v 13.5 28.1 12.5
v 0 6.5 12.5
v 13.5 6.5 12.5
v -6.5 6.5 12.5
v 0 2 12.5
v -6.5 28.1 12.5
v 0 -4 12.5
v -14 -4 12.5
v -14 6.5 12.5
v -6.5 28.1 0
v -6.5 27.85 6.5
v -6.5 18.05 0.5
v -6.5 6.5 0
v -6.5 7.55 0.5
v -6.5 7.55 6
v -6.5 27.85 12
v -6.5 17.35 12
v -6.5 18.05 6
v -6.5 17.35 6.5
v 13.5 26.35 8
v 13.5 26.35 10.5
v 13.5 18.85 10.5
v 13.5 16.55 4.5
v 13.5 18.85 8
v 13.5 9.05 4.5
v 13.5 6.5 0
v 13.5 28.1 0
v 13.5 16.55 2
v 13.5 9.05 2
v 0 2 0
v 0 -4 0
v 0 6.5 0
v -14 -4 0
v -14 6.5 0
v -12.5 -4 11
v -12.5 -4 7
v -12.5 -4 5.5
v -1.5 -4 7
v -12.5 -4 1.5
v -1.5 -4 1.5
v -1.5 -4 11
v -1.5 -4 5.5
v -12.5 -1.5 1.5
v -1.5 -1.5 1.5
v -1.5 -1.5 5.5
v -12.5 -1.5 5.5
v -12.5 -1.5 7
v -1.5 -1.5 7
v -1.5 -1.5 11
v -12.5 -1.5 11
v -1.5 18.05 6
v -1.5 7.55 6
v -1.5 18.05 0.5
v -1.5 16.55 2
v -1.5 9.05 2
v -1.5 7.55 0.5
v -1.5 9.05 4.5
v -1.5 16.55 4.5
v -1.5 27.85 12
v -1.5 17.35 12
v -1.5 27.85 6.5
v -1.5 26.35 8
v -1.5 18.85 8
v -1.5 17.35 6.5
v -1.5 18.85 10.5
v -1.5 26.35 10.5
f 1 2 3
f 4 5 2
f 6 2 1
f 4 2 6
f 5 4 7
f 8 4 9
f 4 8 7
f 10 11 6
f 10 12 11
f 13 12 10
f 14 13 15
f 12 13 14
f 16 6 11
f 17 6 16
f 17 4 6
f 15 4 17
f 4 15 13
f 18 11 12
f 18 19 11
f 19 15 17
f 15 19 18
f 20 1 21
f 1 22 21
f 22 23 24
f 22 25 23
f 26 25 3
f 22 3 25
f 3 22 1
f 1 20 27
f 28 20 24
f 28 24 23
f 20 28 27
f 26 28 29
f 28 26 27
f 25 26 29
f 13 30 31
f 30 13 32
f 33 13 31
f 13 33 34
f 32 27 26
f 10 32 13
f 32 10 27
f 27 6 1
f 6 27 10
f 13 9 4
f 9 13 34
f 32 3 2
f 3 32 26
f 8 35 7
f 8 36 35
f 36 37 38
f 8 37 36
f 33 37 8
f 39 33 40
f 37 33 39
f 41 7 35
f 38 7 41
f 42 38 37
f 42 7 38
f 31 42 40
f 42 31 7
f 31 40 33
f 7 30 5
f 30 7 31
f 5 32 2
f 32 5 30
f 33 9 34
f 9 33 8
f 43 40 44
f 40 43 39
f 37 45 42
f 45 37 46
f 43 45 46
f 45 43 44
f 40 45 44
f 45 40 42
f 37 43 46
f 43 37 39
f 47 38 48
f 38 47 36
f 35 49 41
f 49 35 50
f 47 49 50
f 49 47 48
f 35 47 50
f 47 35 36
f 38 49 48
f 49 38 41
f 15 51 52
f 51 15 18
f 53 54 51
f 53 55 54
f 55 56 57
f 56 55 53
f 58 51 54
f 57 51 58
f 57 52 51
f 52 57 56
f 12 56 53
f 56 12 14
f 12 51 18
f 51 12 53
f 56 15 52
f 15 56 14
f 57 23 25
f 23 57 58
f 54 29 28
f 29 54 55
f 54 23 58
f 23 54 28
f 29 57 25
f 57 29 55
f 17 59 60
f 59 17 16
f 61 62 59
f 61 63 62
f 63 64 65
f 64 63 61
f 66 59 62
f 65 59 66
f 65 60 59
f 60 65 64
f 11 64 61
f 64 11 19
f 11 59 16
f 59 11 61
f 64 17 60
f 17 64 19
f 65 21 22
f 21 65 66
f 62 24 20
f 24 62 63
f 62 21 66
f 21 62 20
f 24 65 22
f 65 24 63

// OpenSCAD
// Minimum thickness of the wall around elements
wall=1.5;
// Mounting magnet dimensions.
magnet=[4,11,2.5];
// Number of magnets to build side by side, for added strength
num_magnets=2;
// Coordinates of mounting holes, relative to a full solenoid frame
screw_mounts=[[2,3.8], [8,13.6]];
// Pinball button
button_height=6; // highest point, for mount to clear completely
button_travel=3; // from the higherst point, how much it can be pressed, when in the center (there is a dimple too)
solenoid_stroke=10; // Including idle state protrusion
// How much to move solenoid body away from the surface to account for button size and extra motion
solenoid_travel_offset=solenoid_stroke-button_travel+button_height-wall-magnet[2];

// Solenoid mounting screws
screw_head_d=5.5;
screw_body_d=2.5;
screw_length=17;
// How much can screw go into the frame of the solenoid
solenoid_thread_depth=2;
// Back-and forth adjustment to account for different button height
screw_adjustment=5;

// width of magnet mounts and solenoid mount should match
structure_width=max(
    (magnet[0]+wall)*num_magnets+wall,
    max(screw_mounts[0][0],screw_mounts[1][0])+wall*2
);

rotate([0,-90,0]) difference() {
    body();
    // magnet cutout
    for (i=[0:num_magnets-1]) {
        rotate([90,0,0]) translate([wall+i*(wall+magnet[0]), wall, wall]) cube(magnet);
    }
    // screw hole
    for (s=screw_mounts) {
        #translate(
            // ALl this complex calculation to place it in the middle of the structure
            [(structure_width-max(screw_mounts[0][0], screw_mounts[1][0])-min(screw_mounts[0][0], screw_mounts[1][0]))/2+s[0], 
            s[1]+solenoid_travel_offset, 
            wall]
        ) screw_mount();
    }
    // space for the button
    translate([0,-magnet[2]-wall,-screw_length]) cube([structure_width, button_height, screw_length]);
}

// Solid body, from which we will cut pieces out
module body() {
    union() {
        // padding for the screw length, so that it does not go deeper than solenoid_thread_depth
        extra_padding=screw_length-solenoid_thread_depth-wall;
        // solenoid mount body
        translate([0,solenoid_travel_offset-screw_adjustment/2,-extra_padding]) cube([
            structure_width, 
            max(screw_mounts[0][1],screw_mounts[1][1])+screw_adjustment+wall*2,
            wall+extra_padding+5]); // 5 for extra overlap with magnets
        // Magnet holder
        // Making sure we contact solenoid body too
        contact_adjustment=solenoid_travel_offset-screw_adjustment/2;
        rotate([90,0,0]) 
            translate([0,0,-contact_adjustment]) 
            cube([structure_width, magnet[1]+wall*2, magnet[2]+wall+contact_adjustment]);
    }
}

// Cutout that needs to be made for the screw, including head depth, and length, and some wiggle room
module screw_mount() {
    // screw head
    translate([-screw_head_d/2, -(screw_head_d+screw_adjustment)/2, 0]) cube([screw_head_d, screw_head_d+screw_adjustment,max(magnet)]);
    // screw body
    translate([-screw_body_d/2, -(screw_body_d+screw_adjustment)/2, -screw_length]) cube([screw_body_d, screw_body_d+screw_adjustment,screw_length]);    
}
